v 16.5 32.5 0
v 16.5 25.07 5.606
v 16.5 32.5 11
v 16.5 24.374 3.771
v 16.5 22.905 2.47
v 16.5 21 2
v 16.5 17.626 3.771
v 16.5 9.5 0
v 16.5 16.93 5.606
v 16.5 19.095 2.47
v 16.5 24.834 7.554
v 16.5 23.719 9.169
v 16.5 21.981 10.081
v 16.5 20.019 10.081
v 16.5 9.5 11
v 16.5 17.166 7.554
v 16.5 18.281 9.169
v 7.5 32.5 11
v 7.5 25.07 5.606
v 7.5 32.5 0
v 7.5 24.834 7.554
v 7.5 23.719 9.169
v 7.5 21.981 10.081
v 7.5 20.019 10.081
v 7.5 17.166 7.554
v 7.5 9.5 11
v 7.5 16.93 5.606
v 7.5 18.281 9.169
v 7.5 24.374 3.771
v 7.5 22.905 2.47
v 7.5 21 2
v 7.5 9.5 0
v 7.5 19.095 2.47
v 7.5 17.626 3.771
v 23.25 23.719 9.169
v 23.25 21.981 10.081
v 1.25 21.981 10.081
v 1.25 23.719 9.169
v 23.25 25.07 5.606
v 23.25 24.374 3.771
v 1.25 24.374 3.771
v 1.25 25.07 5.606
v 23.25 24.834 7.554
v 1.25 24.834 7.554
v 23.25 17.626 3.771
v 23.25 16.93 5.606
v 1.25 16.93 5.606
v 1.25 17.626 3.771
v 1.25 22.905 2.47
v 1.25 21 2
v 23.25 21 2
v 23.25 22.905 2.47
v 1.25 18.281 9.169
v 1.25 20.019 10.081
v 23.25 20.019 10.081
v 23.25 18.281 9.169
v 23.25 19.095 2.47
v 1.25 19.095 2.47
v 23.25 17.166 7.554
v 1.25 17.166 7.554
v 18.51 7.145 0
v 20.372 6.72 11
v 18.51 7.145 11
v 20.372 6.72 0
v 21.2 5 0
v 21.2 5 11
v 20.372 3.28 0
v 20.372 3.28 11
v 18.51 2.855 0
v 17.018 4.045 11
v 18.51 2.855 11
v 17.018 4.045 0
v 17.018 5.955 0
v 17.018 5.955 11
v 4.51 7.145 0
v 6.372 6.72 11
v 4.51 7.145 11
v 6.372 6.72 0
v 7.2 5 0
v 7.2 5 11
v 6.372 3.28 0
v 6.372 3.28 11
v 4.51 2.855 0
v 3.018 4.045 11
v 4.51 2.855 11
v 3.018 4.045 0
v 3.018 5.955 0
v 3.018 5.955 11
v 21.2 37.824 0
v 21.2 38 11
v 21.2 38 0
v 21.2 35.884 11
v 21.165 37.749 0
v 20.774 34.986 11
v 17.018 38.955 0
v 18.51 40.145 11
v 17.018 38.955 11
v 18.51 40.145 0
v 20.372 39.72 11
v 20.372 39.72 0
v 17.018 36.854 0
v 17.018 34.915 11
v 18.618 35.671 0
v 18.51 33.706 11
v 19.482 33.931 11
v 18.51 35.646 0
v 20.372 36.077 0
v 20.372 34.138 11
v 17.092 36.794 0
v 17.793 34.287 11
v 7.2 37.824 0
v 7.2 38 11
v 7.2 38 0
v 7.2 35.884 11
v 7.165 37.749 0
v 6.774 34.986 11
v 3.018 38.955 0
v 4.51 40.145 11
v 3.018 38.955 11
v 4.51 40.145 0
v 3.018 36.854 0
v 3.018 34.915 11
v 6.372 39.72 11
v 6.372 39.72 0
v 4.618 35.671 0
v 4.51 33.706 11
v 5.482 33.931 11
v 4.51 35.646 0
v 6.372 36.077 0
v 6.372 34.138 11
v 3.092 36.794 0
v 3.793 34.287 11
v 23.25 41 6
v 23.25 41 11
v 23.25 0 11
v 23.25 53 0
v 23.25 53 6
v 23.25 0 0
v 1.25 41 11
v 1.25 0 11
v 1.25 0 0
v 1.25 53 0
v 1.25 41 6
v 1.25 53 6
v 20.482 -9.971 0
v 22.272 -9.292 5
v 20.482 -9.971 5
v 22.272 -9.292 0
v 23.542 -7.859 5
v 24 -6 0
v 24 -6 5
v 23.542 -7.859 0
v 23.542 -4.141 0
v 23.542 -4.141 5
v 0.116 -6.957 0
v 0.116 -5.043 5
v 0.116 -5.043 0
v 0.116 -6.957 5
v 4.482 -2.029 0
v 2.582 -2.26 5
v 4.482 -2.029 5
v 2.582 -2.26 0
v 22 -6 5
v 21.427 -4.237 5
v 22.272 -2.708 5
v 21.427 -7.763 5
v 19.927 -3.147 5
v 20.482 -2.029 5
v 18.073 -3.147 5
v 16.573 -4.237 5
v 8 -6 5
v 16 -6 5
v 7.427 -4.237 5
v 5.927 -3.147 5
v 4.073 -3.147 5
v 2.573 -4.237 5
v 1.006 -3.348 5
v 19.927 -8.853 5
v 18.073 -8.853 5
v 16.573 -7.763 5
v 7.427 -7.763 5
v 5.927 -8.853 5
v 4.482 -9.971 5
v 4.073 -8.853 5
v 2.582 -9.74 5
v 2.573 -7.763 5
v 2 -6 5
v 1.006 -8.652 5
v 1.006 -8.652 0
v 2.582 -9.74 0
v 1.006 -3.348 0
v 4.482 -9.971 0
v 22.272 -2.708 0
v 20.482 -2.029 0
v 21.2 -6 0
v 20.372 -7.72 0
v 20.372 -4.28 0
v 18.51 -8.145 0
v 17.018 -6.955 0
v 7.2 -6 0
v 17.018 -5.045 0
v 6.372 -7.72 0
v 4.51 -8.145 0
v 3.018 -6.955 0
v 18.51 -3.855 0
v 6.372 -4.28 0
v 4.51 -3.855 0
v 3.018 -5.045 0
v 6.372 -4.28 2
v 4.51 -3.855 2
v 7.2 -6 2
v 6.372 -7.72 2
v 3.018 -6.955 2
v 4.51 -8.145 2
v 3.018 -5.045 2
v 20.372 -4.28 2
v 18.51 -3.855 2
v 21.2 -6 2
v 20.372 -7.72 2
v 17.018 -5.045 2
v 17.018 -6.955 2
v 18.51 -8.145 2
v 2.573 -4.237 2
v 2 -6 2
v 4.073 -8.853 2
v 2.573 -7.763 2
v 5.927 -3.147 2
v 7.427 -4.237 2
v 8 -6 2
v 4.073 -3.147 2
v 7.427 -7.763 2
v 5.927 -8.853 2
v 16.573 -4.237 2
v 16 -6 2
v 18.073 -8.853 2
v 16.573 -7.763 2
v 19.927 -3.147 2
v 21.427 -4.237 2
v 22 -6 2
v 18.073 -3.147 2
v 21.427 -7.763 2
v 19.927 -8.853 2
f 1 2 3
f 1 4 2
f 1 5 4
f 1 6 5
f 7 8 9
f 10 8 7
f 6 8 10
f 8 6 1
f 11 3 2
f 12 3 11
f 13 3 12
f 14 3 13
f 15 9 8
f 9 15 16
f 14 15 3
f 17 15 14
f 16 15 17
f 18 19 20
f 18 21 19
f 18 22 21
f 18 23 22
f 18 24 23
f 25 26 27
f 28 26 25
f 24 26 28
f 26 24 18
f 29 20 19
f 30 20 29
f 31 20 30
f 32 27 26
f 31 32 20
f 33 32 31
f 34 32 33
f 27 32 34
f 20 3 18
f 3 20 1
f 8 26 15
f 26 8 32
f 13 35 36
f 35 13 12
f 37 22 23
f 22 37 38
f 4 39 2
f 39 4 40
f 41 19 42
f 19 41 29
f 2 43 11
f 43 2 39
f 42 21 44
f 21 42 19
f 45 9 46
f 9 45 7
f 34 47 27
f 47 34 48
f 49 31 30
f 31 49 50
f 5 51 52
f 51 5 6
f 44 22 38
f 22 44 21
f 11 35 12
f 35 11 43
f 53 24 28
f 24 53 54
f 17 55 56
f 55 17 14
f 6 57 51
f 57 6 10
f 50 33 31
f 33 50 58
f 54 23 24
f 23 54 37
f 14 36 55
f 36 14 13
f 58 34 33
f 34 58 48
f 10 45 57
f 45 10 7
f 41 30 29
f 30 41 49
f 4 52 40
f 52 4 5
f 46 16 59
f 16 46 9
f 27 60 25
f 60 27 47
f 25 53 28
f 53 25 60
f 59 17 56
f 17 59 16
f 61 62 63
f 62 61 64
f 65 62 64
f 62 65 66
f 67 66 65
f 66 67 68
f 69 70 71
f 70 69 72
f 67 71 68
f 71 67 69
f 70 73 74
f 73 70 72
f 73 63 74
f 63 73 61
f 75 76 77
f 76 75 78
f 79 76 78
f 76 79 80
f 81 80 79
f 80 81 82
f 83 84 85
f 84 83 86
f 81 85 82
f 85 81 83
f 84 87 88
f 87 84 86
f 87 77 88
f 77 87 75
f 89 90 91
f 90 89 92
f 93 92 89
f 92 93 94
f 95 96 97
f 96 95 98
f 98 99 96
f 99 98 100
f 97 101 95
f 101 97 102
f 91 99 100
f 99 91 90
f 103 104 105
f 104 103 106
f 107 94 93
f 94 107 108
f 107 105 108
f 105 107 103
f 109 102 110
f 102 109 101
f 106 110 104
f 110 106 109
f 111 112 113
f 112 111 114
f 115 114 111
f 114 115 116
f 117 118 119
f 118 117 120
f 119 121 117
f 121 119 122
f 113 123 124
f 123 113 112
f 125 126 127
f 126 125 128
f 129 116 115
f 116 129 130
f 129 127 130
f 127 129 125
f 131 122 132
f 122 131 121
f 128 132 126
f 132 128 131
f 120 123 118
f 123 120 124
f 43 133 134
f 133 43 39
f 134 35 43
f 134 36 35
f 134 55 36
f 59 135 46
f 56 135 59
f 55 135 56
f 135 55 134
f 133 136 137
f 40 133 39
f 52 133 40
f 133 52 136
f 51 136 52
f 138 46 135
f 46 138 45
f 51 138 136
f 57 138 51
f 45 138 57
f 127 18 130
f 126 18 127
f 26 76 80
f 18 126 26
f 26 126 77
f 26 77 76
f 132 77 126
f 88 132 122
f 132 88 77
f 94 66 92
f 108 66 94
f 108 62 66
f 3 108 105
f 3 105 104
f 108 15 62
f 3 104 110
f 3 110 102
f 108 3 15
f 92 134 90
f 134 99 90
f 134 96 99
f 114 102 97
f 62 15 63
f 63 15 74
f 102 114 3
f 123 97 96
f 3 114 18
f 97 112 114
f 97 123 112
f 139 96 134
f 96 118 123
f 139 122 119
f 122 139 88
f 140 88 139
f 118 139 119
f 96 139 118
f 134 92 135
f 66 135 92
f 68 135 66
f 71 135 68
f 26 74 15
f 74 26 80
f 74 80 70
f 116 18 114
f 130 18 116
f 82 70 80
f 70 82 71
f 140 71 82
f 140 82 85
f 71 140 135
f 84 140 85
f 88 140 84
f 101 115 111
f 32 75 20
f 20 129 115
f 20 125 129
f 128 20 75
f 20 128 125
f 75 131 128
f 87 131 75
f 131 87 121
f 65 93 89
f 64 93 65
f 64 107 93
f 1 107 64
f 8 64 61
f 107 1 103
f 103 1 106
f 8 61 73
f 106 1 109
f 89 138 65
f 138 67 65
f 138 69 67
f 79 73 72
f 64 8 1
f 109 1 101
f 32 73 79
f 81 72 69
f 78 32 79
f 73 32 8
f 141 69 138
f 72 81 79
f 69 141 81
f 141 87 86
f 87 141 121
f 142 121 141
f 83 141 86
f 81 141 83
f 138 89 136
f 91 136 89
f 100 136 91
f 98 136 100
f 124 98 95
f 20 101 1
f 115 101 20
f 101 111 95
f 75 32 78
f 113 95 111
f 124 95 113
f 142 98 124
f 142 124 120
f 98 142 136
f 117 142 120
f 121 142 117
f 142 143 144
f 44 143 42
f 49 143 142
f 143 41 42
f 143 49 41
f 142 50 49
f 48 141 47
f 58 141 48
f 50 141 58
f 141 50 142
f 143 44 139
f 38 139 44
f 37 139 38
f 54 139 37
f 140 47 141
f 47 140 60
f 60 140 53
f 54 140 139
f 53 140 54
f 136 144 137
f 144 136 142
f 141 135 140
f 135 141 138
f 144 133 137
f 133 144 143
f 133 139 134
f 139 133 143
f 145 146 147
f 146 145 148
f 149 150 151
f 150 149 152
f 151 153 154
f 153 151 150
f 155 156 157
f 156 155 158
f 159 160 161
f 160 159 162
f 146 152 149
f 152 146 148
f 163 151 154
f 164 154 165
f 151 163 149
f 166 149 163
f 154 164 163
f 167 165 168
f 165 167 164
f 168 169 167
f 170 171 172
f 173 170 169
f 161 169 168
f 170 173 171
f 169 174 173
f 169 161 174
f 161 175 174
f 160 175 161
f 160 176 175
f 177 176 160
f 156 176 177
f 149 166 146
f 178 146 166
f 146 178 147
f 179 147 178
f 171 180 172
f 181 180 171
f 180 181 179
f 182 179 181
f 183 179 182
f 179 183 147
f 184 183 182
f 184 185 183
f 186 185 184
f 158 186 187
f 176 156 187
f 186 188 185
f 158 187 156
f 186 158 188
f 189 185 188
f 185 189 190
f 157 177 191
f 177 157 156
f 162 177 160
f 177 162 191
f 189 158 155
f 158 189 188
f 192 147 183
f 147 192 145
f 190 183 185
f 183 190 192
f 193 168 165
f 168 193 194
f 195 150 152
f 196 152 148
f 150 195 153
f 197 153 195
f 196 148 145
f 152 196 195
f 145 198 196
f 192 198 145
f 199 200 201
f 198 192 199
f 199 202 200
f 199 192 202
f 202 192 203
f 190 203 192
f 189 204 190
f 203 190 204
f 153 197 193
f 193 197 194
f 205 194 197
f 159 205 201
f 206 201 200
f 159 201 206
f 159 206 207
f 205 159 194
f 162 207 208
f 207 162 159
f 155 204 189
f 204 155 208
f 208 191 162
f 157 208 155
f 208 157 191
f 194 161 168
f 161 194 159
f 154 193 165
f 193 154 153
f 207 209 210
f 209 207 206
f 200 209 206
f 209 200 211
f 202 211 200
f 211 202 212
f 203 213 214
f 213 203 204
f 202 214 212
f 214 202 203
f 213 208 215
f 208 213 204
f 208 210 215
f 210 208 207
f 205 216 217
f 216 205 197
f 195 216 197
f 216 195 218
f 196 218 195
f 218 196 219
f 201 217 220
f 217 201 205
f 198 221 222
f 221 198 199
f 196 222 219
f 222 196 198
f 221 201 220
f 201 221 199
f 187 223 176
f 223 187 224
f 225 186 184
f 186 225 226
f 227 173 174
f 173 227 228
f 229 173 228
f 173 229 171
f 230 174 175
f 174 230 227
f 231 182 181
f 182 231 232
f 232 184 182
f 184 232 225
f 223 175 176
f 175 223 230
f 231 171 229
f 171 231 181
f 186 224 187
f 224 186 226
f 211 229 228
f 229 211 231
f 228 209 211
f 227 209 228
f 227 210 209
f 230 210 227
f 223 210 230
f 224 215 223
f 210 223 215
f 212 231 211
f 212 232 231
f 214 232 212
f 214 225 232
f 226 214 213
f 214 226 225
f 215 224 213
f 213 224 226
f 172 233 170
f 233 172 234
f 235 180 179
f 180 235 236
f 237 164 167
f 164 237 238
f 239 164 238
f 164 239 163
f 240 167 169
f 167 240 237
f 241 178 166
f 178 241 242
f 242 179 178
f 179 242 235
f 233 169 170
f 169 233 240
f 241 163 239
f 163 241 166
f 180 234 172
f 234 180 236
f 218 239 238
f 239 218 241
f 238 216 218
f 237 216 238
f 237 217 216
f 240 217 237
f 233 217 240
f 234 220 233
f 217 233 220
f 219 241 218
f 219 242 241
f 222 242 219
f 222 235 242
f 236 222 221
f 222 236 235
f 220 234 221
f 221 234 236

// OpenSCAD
module extruder_idler_base(){
 translate([1.25,0,0]) cube([22,42+11,8+3]);
	
}

module extruder_idler_holes(){
 translate([12,21,0]){
  // Main cutout
  cube([9,23,25], center=true);
  // Idler shaft
  translate([-12,0,4.1+2])rotate([0,90,0])cylinder(r=4.1, h=24);
  // Screw holes
  translate([7,-16,-1]) cylinder(r=2.2, h=24);
  translate([-7,-16,-1]) cylinder(r=2.2, h=24);
  hull() {
    translate([7,17,-1]) cylinder(r=2.2, h=24);
    translate([7,17,-1]) rotate([10,0,0]) cylinder(r=2.2, h=24);
  }
  hull() {
    translate([-7,17,-1]) cylinder(r=2.2, h=24);
    translate([-7,17,-1]) rotate([10,0,0]) cylinder(r=2.2, h=24);
  }
 }
}


// Idler final part
module idler(){
 difference(){
  extruder_idler_base();
  extruder_idler_holes();
  translate([0,41,6]) cube(size=[25,20,10]);
 }
}

idler();
translate([0,-6,0]) screwholder();

module screwholder() {
	difference() {
		hull() {
			translate([4,0,0]) cylinder(r=4,h=5);
			translate([20,0,0]) cylinder(r=4,h=5);
		}
  		translate([5,0,-1])cylinder(r=2.2, h=24);
  		translate([19,0,-1])cylinder(r=2.2, h=24);
  		translate([5,0,2])cylinder(r=6/2, h=24);
  		translate([19,0,2])cylinder(r=6/2, h=24);
	}
}
